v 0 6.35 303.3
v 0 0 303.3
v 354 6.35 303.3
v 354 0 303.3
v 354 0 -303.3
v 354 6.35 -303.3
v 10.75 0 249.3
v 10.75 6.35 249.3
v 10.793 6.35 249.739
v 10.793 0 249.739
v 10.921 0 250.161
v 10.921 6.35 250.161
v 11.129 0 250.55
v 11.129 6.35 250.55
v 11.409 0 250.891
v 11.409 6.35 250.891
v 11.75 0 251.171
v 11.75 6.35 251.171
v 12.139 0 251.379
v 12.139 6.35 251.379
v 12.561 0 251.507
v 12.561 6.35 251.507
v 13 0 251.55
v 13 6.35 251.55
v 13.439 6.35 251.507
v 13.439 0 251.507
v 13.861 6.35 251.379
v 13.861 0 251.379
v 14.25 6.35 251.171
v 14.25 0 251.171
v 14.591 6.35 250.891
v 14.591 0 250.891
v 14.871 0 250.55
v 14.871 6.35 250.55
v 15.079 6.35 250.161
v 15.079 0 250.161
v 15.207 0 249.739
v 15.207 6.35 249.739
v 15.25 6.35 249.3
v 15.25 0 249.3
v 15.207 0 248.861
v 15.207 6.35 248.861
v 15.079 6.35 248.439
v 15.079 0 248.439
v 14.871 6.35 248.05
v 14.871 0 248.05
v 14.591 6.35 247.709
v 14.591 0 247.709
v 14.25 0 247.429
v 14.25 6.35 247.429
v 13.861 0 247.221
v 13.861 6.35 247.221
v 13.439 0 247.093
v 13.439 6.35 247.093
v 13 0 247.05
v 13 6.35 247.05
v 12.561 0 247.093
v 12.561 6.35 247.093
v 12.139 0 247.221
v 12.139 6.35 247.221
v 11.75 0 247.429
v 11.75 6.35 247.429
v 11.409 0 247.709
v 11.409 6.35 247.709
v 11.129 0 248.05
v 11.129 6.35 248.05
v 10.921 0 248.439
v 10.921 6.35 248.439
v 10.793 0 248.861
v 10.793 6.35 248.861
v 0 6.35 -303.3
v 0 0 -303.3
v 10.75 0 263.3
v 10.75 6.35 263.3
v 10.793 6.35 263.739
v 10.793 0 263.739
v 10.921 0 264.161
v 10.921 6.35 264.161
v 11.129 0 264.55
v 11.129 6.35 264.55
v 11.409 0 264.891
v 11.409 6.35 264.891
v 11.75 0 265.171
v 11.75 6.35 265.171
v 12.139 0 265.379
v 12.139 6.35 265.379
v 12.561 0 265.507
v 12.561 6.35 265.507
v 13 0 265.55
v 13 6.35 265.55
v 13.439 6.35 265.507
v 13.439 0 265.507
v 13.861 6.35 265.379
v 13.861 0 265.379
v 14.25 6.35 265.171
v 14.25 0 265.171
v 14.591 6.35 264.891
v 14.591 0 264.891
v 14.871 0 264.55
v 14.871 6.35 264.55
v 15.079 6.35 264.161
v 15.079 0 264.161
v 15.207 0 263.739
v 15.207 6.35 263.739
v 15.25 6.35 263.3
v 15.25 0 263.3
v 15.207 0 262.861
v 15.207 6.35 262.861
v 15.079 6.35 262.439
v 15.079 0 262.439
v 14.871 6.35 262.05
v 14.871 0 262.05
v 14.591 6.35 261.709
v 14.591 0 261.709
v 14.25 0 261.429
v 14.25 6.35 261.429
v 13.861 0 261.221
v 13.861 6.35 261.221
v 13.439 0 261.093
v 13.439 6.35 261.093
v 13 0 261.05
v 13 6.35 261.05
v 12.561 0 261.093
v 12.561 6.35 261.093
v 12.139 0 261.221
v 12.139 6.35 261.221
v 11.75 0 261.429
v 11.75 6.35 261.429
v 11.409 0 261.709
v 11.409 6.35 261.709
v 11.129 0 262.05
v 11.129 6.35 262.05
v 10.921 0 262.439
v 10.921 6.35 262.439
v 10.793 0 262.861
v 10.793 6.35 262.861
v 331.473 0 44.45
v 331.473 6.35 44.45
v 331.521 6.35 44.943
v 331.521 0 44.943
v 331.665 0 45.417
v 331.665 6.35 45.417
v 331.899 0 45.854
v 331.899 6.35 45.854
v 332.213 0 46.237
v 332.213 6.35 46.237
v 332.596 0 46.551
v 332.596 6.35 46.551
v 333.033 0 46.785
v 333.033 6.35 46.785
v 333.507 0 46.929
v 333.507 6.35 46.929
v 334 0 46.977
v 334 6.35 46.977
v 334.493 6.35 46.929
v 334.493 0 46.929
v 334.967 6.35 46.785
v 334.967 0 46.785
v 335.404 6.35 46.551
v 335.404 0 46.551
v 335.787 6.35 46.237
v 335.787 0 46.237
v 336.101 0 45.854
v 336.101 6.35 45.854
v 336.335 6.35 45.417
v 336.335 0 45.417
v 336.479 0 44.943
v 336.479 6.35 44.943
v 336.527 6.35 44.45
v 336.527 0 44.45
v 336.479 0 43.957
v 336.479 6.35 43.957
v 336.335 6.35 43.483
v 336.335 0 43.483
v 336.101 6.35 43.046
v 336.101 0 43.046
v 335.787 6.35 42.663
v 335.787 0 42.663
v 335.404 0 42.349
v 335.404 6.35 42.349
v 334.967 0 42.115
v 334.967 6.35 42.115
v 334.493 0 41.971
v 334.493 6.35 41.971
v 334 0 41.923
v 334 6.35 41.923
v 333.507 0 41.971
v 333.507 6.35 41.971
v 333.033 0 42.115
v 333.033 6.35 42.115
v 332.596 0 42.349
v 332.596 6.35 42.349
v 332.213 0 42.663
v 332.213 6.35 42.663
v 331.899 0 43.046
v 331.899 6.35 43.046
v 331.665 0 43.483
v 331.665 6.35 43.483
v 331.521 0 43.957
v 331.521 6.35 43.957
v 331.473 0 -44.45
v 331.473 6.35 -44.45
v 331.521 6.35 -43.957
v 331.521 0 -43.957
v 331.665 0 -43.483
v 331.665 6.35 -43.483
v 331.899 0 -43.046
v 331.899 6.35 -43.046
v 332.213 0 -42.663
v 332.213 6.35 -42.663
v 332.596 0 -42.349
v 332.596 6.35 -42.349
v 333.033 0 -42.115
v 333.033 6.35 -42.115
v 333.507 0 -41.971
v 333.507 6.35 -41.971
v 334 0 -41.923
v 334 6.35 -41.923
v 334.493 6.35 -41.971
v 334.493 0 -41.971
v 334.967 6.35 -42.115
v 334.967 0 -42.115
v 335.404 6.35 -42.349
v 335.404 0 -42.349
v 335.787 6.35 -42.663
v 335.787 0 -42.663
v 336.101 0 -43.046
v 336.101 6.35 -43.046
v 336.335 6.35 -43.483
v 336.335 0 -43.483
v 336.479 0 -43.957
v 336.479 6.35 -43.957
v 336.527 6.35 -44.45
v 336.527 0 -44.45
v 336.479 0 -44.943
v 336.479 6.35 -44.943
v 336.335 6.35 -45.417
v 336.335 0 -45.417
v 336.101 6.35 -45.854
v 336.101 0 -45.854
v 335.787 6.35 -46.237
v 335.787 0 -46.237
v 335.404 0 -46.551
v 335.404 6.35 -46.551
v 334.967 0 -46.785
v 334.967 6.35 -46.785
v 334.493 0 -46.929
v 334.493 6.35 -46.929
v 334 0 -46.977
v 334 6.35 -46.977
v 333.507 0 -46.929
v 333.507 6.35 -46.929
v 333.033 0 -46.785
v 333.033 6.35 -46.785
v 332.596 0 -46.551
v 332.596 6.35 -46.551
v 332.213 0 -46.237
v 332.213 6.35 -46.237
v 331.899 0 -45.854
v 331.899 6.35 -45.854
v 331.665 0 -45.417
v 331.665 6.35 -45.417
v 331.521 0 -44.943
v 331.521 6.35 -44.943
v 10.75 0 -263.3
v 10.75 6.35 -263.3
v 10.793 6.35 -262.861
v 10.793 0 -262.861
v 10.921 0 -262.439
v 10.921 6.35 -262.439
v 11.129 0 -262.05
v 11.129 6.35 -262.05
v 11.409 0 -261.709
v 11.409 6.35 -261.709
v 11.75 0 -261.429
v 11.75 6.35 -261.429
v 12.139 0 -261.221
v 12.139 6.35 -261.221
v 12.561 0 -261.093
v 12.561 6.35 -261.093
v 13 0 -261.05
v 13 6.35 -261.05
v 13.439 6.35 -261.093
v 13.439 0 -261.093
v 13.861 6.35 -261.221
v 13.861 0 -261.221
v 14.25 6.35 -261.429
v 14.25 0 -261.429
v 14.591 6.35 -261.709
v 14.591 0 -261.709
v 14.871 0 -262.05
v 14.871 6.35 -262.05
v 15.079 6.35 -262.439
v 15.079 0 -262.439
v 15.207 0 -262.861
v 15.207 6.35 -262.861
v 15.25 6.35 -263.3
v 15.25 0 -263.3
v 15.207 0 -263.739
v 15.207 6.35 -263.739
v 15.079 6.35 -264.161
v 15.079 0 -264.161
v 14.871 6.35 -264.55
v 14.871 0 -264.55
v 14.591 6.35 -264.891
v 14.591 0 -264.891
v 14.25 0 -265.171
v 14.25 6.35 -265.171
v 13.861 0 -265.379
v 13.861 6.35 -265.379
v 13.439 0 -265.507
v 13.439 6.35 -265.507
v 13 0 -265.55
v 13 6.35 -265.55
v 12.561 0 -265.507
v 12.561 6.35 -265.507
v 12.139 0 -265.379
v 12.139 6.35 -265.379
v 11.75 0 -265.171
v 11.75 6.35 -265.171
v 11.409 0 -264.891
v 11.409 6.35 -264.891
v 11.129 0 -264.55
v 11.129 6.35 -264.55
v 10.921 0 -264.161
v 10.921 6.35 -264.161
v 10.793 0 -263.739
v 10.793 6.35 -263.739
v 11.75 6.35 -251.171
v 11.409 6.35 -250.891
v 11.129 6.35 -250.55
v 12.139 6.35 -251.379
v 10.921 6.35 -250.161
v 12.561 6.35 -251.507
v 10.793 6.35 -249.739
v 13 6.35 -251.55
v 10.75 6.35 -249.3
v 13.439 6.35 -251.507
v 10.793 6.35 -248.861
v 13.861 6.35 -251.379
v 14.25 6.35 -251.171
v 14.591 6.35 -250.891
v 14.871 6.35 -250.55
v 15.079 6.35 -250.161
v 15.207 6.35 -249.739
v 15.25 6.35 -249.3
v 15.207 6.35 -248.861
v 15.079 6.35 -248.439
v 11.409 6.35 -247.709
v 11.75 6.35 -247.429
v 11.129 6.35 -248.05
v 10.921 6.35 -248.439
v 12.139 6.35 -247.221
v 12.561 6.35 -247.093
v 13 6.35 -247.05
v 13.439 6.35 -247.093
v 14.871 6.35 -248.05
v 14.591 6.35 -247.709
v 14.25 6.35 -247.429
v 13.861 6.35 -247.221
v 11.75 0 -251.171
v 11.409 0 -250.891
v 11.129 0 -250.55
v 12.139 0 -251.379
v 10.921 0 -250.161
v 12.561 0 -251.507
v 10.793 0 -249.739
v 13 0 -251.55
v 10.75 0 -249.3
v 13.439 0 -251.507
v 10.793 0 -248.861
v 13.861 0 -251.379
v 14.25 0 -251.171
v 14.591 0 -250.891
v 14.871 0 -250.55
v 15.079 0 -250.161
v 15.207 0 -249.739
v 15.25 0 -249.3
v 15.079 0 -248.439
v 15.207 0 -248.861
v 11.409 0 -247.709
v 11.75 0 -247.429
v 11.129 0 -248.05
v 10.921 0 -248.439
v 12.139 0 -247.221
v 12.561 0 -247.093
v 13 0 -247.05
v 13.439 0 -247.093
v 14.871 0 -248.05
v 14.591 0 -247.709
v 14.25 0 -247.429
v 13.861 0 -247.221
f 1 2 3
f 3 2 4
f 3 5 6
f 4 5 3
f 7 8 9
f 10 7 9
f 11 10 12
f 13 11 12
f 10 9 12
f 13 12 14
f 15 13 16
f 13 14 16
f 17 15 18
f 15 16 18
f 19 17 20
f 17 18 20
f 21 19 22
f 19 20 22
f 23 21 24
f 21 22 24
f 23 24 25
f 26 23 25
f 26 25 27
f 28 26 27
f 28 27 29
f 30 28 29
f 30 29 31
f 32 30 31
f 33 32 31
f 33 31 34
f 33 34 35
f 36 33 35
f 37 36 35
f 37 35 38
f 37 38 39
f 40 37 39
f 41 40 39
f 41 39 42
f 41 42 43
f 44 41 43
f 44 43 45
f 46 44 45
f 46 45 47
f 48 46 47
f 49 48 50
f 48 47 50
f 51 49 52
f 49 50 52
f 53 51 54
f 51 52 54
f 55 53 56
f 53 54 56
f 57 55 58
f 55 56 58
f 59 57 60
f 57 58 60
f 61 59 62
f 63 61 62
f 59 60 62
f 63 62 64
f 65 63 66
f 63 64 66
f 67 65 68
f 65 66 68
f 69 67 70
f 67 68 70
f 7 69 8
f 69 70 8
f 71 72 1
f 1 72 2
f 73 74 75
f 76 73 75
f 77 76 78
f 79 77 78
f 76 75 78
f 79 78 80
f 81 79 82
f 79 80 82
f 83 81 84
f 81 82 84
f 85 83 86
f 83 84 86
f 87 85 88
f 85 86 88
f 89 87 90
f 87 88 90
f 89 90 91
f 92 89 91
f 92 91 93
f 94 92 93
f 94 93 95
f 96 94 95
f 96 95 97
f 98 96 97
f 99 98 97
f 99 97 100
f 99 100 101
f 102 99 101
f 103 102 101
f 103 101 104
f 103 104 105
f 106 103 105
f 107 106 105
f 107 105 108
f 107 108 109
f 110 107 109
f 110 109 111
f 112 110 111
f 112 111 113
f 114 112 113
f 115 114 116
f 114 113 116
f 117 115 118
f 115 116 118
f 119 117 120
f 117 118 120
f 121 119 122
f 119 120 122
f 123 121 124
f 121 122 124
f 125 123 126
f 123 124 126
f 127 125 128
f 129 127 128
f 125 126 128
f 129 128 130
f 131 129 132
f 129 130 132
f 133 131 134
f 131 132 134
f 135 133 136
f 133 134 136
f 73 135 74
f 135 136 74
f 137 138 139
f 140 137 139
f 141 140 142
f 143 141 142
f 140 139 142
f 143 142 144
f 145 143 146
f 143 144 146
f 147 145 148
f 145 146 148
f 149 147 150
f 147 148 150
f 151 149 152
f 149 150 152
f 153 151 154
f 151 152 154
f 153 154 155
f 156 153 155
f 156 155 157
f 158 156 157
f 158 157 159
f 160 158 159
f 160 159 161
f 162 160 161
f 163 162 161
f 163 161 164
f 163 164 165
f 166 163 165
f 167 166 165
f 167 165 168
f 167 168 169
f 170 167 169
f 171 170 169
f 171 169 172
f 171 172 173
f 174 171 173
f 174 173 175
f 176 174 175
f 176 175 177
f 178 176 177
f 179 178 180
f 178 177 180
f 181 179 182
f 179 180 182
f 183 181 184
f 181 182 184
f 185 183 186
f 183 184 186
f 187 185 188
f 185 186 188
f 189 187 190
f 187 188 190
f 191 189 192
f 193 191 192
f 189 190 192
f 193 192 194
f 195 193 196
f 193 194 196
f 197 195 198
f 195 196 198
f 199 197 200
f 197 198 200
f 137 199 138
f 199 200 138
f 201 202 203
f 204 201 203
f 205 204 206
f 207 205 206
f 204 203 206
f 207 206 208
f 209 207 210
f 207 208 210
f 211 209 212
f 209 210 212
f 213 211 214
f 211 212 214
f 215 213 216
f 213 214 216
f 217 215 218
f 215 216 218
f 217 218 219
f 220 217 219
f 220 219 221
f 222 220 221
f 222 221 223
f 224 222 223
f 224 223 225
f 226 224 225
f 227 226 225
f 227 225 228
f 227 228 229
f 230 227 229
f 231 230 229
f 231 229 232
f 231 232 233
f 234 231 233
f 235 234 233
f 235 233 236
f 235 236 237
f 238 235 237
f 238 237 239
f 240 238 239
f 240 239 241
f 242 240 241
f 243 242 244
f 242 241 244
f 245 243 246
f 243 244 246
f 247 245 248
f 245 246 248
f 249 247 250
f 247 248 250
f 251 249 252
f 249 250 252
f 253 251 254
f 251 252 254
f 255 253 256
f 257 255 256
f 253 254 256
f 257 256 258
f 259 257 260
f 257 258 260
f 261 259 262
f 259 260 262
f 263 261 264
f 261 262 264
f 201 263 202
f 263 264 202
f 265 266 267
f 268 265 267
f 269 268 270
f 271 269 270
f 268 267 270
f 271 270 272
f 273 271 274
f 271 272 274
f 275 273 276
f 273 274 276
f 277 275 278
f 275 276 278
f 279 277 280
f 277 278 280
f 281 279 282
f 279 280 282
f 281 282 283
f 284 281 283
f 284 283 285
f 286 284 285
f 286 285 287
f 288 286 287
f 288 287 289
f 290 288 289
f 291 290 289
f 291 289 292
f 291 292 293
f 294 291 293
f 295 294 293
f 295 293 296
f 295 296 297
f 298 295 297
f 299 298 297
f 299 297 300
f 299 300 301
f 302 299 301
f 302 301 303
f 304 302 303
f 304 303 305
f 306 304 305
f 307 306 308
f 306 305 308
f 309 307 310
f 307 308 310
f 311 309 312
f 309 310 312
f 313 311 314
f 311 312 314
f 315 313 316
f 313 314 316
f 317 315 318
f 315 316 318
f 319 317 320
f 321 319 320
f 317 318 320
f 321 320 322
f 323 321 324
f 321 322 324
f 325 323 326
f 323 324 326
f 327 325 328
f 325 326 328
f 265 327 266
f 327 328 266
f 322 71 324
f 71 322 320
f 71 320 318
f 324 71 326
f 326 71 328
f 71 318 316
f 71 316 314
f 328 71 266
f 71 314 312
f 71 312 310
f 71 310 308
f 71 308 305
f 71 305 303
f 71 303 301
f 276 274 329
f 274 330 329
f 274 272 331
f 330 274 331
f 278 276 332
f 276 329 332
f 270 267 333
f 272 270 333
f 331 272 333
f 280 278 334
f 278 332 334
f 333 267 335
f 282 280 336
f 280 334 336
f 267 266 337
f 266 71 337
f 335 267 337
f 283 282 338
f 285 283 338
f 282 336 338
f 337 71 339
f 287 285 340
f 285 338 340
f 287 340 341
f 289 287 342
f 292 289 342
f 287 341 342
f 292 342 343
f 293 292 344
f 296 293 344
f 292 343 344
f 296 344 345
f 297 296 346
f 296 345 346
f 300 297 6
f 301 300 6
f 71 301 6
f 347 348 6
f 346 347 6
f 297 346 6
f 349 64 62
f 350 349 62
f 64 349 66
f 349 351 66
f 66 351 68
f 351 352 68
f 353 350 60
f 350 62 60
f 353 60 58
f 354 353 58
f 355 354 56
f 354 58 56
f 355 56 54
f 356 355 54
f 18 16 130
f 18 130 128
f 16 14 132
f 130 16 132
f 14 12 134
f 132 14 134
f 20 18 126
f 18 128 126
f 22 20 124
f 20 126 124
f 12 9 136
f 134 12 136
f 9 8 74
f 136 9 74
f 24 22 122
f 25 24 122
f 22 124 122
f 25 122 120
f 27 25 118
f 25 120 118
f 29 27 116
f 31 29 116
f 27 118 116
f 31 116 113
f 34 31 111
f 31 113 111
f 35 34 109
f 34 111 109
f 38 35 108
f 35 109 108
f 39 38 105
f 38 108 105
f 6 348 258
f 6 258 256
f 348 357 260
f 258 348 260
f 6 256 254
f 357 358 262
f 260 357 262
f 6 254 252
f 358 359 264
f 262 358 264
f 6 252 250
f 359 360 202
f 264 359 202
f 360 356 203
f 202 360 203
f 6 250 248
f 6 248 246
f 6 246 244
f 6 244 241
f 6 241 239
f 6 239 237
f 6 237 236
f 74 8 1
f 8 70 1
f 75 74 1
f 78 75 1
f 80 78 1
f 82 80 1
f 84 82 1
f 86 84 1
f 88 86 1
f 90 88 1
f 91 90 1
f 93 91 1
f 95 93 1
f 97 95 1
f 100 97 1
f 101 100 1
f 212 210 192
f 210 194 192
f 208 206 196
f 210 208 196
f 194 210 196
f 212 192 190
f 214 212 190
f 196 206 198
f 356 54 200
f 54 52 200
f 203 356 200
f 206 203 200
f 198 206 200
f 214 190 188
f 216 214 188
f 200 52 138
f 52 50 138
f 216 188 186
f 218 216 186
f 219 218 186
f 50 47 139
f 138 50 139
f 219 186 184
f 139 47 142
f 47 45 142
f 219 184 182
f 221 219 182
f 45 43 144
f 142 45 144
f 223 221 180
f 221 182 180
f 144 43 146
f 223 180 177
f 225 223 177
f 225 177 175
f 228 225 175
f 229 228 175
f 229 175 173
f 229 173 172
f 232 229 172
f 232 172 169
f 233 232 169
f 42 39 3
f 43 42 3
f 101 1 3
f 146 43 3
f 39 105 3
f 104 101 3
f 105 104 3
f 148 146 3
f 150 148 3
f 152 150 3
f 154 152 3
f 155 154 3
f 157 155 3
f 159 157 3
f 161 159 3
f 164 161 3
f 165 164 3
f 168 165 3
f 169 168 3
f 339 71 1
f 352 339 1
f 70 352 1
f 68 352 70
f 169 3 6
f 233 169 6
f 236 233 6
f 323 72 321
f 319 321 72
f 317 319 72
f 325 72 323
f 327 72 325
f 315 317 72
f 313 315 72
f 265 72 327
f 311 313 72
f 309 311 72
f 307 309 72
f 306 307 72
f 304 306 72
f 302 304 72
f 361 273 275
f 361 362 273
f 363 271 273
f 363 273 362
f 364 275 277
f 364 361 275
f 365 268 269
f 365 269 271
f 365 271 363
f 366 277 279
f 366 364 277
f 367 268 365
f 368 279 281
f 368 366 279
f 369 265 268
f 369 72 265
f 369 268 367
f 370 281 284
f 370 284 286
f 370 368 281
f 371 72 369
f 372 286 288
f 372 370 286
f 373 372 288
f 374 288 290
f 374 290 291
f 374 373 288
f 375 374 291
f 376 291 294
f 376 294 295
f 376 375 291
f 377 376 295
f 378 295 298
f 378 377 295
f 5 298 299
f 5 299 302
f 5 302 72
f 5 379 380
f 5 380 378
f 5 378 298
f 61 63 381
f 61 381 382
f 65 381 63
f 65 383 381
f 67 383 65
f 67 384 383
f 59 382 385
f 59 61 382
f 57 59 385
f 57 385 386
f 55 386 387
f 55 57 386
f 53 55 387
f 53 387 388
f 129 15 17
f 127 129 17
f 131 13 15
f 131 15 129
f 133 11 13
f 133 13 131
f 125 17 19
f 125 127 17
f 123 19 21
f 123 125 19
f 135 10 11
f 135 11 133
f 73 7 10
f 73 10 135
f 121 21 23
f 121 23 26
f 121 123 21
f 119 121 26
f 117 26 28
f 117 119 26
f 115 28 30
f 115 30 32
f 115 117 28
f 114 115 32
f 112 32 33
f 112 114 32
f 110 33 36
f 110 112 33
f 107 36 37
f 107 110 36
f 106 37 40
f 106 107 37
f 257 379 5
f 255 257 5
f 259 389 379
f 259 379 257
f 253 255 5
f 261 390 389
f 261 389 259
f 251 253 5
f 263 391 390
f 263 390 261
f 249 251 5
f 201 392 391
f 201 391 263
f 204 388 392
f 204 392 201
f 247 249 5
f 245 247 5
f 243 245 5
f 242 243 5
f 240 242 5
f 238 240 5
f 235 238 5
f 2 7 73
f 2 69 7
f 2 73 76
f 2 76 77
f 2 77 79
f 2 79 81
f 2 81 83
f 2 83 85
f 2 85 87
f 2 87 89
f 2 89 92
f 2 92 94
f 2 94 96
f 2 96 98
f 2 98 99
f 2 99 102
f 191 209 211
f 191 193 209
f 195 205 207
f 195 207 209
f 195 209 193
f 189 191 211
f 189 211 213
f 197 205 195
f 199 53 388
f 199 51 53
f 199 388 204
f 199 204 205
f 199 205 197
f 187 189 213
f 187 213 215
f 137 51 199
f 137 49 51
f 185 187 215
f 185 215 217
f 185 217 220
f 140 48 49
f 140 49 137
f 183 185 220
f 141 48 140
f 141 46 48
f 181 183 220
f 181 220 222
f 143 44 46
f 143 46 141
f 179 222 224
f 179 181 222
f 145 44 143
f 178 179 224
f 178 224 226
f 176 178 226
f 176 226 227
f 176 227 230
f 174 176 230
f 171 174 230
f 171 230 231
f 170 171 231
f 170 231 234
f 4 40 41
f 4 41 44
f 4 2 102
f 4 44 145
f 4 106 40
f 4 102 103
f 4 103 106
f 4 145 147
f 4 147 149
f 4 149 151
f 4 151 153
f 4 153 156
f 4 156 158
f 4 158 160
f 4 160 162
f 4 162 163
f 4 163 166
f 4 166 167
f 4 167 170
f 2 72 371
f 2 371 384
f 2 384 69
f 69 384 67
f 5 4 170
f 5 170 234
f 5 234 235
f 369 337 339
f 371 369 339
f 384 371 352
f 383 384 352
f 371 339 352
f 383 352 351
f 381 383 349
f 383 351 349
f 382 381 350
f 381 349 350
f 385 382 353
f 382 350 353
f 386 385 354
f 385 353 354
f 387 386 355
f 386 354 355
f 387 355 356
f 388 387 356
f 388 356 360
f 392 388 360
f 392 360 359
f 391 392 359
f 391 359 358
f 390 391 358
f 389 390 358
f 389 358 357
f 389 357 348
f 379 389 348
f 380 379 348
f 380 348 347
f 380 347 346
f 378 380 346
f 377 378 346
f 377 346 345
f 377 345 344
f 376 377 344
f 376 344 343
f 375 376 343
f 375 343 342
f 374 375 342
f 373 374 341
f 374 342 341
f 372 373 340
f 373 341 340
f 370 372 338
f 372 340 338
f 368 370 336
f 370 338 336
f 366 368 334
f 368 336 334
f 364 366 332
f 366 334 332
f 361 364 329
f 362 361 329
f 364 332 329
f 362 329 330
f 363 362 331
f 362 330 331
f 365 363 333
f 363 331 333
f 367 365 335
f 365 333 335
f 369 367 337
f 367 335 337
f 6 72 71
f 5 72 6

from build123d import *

# Parameters (mm, degrees)
F0_W     = 354
F0_H     = 606.6
F1_DEPTH = 6.35
F2_D     = 4.5
F3_D     = 5.0546


with BuildPart() as f1:
    # F0 (on Front) → F1 (new body)
    with BuildSketch(Plane.XZ):
        with Locations((177, 0)):
            Rectangle(F0_W, F0_H)
    extrude(amount=-F1_DEPTH)

    # F2 (through all)
    with Locations(Plane.XZ):
        with Locations((13, 263.3), (13, 249.3), (13, -249.3), (13, -263.3)):
            Hole(F2_D / 2)

    # F3 (through all)
    with Locations(Plane.XZ):
        with Locations((334, 44.45), (334, -44.45)):
            Hole(F3_D / 2)


solid = f1.part
